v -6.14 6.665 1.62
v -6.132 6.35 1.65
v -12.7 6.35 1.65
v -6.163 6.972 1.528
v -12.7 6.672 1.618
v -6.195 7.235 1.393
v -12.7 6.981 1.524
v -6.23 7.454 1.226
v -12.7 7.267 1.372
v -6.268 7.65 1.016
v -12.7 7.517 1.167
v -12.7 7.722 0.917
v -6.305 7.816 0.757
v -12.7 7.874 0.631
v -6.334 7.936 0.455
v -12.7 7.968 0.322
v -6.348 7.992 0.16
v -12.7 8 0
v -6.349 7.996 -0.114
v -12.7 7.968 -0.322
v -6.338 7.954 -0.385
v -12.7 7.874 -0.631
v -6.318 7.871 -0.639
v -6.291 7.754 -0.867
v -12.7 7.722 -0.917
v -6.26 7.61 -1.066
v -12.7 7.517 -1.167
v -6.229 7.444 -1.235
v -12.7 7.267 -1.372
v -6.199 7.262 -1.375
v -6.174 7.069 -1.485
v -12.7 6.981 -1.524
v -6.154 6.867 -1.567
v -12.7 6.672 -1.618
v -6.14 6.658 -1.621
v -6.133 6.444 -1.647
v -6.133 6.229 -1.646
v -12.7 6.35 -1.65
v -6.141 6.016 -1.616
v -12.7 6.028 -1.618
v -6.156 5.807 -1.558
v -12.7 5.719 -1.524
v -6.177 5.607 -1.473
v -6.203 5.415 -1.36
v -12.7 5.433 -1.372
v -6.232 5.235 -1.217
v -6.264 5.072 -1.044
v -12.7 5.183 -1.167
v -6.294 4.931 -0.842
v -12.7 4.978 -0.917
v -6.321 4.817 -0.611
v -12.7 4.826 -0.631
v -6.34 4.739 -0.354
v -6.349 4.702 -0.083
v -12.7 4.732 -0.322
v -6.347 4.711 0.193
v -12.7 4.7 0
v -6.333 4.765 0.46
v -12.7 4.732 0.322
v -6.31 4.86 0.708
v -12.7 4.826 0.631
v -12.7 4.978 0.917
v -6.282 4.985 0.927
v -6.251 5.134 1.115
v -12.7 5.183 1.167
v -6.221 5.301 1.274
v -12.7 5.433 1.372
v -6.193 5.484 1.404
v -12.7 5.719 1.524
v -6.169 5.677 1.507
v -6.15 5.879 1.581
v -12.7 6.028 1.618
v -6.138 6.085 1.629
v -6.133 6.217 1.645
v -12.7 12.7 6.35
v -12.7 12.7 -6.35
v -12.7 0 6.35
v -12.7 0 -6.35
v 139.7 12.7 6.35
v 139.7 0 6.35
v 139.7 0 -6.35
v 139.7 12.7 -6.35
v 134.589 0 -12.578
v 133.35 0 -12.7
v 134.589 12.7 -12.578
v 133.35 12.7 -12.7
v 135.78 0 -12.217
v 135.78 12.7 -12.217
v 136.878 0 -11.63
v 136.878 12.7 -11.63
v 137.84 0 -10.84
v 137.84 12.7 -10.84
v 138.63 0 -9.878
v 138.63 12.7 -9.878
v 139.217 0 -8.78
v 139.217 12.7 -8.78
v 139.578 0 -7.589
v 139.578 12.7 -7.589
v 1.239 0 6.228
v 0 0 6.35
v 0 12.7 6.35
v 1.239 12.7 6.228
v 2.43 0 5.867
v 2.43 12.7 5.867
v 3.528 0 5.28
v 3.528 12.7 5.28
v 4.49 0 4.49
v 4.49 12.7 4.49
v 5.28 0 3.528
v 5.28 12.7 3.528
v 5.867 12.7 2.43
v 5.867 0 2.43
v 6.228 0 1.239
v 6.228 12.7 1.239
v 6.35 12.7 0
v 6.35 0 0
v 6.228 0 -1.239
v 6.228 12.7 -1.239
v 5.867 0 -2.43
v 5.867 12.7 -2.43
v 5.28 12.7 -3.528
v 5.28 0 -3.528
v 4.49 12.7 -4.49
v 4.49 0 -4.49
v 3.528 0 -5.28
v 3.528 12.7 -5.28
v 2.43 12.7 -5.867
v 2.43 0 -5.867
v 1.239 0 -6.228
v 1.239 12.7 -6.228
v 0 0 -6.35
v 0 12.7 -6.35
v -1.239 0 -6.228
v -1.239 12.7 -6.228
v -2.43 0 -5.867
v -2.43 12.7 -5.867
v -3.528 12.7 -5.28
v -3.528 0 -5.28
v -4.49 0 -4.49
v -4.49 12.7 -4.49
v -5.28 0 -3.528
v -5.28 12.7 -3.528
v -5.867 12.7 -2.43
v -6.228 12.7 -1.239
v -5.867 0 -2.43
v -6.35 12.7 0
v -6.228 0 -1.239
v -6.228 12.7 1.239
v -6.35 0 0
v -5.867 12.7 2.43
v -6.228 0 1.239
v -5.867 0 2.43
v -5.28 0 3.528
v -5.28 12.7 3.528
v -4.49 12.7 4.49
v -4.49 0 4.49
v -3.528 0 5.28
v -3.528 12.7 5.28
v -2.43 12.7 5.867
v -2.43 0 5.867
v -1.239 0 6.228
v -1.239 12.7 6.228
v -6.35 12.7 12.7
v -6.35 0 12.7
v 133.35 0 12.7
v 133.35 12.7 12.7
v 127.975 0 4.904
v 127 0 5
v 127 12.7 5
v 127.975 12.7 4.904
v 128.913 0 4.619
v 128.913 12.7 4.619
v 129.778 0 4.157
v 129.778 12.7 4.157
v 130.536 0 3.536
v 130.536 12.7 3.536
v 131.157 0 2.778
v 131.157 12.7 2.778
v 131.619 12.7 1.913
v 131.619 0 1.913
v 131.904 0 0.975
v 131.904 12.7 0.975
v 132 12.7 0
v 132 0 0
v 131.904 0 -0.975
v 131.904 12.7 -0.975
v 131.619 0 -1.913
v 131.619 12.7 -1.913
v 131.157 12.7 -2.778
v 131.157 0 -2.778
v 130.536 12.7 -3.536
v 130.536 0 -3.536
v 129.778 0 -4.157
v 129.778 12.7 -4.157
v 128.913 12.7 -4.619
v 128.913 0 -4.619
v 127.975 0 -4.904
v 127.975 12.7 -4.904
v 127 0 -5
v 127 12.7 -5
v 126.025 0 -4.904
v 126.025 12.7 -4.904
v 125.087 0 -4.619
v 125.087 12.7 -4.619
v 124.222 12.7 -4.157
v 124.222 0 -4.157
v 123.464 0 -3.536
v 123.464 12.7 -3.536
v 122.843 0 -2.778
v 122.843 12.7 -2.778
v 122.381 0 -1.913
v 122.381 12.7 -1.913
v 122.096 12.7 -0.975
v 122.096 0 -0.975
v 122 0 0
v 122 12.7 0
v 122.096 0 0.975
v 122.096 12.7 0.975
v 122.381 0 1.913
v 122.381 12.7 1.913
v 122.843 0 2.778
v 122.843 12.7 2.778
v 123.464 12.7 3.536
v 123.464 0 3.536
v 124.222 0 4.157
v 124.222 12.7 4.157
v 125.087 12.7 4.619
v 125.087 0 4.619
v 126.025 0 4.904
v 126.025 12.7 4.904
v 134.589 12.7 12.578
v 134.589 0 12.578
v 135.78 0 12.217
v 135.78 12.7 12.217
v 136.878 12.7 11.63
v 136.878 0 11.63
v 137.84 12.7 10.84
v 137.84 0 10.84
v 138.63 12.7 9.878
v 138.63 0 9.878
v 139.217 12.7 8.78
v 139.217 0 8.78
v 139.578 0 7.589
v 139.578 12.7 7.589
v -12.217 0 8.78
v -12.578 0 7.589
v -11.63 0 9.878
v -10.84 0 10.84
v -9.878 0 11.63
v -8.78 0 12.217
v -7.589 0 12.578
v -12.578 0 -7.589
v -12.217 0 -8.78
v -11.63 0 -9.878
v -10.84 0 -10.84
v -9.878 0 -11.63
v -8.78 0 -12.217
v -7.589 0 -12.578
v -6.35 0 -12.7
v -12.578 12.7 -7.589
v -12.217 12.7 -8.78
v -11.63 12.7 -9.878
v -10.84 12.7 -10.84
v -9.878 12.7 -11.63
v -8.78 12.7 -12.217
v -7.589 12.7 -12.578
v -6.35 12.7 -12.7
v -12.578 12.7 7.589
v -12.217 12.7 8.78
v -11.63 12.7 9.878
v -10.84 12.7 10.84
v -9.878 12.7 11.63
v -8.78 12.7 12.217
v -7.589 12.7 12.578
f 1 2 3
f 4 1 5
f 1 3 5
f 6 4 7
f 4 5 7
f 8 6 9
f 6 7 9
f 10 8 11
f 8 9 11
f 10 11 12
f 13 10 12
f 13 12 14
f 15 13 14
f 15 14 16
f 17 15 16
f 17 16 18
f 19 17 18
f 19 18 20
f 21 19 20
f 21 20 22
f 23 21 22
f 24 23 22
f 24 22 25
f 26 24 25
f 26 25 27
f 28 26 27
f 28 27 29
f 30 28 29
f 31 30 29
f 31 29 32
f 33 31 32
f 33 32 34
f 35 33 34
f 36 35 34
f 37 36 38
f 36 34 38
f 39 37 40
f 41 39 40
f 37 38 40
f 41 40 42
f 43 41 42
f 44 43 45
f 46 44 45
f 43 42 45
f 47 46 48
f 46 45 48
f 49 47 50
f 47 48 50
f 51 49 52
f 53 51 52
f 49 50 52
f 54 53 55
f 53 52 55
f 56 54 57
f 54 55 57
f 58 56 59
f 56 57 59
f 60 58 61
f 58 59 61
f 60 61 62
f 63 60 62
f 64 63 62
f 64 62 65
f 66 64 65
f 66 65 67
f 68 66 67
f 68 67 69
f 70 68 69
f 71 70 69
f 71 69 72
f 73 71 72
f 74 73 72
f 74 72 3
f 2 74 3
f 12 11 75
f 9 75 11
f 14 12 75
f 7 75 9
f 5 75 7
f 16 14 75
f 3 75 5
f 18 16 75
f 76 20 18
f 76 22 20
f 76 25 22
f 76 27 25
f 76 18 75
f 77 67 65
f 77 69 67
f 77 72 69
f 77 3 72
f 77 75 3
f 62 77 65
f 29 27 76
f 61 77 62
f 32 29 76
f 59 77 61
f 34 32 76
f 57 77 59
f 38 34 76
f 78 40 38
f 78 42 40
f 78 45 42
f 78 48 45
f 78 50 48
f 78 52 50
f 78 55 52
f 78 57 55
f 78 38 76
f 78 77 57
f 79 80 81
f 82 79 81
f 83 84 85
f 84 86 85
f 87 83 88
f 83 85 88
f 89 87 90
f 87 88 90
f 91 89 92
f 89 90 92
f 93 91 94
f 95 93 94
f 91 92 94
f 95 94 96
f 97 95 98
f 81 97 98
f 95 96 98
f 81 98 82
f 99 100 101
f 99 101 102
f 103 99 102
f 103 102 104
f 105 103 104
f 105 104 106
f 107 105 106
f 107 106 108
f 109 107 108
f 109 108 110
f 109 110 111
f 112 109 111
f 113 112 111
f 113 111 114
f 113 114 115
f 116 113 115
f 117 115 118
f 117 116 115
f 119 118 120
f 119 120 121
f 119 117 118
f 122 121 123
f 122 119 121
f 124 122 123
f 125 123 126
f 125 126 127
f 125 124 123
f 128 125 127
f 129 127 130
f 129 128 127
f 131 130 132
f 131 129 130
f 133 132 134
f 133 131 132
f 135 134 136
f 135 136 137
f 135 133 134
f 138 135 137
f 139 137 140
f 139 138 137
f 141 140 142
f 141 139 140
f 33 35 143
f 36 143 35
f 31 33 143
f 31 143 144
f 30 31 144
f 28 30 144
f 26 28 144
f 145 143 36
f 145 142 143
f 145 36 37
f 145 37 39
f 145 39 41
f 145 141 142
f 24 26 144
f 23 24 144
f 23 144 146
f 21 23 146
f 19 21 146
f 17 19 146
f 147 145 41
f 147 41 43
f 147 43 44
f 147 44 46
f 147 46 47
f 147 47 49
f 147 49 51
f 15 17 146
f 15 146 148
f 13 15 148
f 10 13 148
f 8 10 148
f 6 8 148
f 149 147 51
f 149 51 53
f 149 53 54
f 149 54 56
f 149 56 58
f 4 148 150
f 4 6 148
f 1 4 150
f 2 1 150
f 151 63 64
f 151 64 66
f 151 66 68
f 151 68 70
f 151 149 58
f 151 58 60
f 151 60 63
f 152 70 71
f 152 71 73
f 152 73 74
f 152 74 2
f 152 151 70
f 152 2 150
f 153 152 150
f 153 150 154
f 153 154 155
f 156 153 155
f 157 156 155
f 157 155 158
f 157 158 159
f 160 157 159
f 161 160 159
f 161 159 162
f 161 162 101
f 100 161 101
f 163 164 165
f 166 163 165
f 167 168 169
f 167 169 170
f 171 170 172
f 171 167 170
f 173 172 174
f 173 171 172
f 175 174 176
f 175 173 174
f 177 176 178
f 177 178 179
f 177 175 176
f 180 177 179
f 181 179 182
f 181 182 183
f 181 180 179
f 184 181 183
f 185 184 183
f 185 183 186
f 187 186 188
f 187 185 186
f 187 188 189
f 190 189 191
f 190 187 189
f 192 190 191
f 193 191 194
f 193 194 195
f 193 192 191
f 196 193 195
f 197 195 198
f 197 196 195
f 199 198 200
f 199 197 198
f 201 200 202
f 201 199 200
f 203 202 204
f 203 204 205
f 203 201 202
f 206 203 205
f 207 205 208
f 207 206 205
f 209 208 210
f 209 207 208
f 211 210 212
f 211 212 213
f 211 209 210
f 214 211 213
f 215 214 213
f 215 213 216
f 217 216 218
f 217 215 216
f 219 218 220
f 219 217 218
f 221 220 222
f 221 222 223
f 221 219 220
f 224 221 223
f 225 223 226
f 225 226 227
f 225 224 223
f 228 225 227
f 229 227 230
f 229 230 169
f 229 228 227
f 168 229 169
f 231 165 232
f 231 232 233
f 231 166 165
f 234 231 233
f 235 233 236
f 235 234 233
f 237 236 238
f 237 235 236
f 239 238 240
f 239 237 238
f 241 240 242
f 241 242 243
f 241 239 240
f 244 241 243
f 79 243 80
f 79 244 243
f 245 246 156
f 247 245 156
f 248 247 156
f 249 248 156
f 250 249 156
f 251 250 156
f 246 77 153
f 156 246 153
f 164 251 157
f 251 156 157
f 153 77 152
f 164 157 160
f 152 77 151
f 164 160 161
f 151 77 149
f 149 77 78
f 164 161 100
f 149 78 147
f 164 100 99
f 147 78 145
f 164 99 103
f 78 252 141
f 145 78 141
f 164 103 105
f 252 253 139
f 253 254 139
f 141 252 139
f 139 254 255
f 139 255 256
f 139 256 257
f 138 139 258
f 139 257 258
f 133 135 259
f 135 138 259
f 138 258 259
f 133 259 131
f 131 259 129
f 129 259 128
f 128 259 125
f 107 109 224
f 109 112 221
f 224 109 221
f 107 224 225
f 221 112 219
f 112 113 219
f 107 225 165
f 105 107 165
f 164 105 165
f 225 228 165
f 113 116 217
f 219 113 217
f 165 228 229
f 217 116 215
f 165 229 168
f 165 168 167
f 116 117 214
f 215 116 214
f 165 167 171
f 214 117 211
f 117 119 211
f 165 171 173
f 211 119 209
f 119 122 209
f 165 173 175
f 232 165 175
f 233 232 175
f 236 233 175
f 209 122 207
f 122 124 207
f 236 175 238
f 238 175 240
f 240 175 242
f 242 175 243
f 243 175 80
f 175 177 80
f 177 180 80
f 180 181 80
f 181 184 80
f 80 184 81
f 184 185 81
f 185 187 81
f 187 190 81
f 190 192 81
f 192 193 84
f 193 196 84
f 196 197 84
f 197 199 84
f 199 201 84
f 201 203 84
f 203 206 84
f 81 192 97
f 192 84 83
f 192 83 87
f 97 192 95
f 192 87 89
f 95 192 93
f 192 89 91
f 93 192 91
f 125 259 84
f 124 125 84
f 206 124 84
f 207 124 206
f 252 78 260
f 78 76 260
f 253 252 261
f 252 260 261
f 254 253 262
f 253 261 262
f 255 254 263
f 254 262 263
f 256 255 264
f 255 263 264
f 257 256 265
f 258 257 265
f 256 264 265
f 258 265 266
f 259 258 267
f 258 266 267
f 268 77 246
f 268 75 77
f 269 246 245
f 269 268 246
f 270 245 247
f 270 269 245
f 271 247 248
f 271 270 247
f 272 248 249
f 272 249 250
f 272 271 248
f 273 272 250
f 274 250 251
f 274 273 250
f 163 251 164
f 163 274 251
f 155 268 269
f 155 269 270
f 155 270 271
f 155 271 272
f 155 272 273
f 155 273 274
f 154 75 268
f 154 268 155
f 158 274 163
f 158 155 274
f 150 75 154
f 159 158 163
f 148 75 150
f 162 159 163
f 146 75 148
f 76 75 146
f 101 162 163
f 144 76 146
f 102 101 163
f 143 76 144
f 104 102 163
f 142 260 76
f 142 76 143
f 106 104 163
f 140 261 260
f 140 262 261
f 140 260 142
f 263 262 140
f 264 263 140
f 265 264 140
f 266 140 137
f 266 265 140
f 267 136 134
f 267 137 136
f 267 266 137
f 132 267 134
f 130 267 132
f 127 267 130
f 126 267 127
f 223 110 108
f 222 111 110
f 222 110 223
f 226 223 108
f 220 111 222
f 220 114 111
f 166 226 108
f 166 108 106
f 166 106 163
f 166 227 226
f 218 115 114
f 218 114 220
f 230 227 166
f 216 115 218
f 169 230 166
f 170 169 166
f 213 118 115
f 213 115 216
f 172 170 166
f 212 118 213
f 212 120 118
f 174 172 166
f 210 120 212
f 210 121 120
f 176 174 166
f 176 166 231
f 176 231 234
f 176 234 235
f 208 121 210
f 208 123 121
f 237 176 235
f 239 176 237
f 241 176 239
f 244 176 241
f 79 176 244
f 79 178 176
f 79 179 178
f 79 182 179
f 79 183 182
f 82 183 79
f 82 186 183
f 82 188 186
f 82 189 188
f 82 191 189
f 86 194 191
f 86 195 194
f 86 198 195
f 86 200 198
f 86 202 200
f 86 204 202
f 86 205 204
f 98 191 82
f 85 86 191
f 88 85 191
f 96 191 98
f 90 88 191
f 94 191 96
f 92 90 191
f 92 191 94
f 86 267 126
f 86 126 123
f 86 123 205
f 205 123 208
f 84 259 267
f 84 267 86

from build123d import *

# Parameters (mm, degrees)
SKETCH1_W                        = 152.4
SKETCH1_H                        = 25.4
SKETCH1_R                        = 6.35
SKETCH1_R_2                      = 5
BOSS_EXTRUDE1_DEPTH              = 12.7
FILLET1_R                        = 6.35
TAP_DRILL_FOR_M4X0_7_TAP1_REACH  = 155.455
TAP_DRILL_FOR_M4X0_7_TAP1_BORE_R = 1.65


with BuildPart() as part:
    # Sketch1 → Boss-Extrude1 (new body)
    with BuildSketch(Plane(origin=(0, 0, 0), x_dir=(1, 0, 0), z_dir=(0, 1, 0))):
        with Locations((63.5, 0)):
            Rectangle(SKETCH1_W, SKETCH1_H)
        with Locations(Location((0, 0, 0), (0, 0, 270))):
            Circle(SKETCH1_R, mode=Mode.SUBTRACT)
        with Locations(Location((127, 0, 0), (0, 0, 270))):
            Circle(SKETCH1_R_2, mode=Mode.SUBTRACT)
    extrude(amount=BOSS_EXTRUDE1_DEPTH)

    # Fillet1
    fillet1_edges = [part.edges().sort_by_distance(p)[0] for p in [
        (-12.7, 6.35, -12.7),
        (139.7, 6.35, -12.7),
        (139.7, 6.35, 12.7),
        (-12.7, 6.35, 12.7),
    ]]
    fillet(fillet1_edges, radius=FILLET1_R)

    # Tap Drill for M4x0.7 Tap1 bore → Tap Drill for M4x0.7 Tap1 (cut, up to next)
    with BuildSketch(Plane.ZY.offset(12.7), mode=Mode.PRIVATE) as tap_drill_for_m4x0_7_tap1_sk1:
        with Locations((0, 6.35)):
            Circle(TAP_DRILL_FOR_M4X0_7_TAP1_BORE_R)
    tap_drill_for_m4x0_7_tap1_tool1 = extrude(tap_drill_for_m4x0_7_tap1_sk1.sketch, amount=-TAP_DRILL_FOR_M4X0_7_TAP1_REACH, mode=Mode.PRIVATE) & part.part
    add(tap_drill_for_m4x0_7_tap1_tool1.solids().sort_by_distance((-12.7, 6.35, 0))[0], mode=Mode.SUBTRACT)


solid = part.part
